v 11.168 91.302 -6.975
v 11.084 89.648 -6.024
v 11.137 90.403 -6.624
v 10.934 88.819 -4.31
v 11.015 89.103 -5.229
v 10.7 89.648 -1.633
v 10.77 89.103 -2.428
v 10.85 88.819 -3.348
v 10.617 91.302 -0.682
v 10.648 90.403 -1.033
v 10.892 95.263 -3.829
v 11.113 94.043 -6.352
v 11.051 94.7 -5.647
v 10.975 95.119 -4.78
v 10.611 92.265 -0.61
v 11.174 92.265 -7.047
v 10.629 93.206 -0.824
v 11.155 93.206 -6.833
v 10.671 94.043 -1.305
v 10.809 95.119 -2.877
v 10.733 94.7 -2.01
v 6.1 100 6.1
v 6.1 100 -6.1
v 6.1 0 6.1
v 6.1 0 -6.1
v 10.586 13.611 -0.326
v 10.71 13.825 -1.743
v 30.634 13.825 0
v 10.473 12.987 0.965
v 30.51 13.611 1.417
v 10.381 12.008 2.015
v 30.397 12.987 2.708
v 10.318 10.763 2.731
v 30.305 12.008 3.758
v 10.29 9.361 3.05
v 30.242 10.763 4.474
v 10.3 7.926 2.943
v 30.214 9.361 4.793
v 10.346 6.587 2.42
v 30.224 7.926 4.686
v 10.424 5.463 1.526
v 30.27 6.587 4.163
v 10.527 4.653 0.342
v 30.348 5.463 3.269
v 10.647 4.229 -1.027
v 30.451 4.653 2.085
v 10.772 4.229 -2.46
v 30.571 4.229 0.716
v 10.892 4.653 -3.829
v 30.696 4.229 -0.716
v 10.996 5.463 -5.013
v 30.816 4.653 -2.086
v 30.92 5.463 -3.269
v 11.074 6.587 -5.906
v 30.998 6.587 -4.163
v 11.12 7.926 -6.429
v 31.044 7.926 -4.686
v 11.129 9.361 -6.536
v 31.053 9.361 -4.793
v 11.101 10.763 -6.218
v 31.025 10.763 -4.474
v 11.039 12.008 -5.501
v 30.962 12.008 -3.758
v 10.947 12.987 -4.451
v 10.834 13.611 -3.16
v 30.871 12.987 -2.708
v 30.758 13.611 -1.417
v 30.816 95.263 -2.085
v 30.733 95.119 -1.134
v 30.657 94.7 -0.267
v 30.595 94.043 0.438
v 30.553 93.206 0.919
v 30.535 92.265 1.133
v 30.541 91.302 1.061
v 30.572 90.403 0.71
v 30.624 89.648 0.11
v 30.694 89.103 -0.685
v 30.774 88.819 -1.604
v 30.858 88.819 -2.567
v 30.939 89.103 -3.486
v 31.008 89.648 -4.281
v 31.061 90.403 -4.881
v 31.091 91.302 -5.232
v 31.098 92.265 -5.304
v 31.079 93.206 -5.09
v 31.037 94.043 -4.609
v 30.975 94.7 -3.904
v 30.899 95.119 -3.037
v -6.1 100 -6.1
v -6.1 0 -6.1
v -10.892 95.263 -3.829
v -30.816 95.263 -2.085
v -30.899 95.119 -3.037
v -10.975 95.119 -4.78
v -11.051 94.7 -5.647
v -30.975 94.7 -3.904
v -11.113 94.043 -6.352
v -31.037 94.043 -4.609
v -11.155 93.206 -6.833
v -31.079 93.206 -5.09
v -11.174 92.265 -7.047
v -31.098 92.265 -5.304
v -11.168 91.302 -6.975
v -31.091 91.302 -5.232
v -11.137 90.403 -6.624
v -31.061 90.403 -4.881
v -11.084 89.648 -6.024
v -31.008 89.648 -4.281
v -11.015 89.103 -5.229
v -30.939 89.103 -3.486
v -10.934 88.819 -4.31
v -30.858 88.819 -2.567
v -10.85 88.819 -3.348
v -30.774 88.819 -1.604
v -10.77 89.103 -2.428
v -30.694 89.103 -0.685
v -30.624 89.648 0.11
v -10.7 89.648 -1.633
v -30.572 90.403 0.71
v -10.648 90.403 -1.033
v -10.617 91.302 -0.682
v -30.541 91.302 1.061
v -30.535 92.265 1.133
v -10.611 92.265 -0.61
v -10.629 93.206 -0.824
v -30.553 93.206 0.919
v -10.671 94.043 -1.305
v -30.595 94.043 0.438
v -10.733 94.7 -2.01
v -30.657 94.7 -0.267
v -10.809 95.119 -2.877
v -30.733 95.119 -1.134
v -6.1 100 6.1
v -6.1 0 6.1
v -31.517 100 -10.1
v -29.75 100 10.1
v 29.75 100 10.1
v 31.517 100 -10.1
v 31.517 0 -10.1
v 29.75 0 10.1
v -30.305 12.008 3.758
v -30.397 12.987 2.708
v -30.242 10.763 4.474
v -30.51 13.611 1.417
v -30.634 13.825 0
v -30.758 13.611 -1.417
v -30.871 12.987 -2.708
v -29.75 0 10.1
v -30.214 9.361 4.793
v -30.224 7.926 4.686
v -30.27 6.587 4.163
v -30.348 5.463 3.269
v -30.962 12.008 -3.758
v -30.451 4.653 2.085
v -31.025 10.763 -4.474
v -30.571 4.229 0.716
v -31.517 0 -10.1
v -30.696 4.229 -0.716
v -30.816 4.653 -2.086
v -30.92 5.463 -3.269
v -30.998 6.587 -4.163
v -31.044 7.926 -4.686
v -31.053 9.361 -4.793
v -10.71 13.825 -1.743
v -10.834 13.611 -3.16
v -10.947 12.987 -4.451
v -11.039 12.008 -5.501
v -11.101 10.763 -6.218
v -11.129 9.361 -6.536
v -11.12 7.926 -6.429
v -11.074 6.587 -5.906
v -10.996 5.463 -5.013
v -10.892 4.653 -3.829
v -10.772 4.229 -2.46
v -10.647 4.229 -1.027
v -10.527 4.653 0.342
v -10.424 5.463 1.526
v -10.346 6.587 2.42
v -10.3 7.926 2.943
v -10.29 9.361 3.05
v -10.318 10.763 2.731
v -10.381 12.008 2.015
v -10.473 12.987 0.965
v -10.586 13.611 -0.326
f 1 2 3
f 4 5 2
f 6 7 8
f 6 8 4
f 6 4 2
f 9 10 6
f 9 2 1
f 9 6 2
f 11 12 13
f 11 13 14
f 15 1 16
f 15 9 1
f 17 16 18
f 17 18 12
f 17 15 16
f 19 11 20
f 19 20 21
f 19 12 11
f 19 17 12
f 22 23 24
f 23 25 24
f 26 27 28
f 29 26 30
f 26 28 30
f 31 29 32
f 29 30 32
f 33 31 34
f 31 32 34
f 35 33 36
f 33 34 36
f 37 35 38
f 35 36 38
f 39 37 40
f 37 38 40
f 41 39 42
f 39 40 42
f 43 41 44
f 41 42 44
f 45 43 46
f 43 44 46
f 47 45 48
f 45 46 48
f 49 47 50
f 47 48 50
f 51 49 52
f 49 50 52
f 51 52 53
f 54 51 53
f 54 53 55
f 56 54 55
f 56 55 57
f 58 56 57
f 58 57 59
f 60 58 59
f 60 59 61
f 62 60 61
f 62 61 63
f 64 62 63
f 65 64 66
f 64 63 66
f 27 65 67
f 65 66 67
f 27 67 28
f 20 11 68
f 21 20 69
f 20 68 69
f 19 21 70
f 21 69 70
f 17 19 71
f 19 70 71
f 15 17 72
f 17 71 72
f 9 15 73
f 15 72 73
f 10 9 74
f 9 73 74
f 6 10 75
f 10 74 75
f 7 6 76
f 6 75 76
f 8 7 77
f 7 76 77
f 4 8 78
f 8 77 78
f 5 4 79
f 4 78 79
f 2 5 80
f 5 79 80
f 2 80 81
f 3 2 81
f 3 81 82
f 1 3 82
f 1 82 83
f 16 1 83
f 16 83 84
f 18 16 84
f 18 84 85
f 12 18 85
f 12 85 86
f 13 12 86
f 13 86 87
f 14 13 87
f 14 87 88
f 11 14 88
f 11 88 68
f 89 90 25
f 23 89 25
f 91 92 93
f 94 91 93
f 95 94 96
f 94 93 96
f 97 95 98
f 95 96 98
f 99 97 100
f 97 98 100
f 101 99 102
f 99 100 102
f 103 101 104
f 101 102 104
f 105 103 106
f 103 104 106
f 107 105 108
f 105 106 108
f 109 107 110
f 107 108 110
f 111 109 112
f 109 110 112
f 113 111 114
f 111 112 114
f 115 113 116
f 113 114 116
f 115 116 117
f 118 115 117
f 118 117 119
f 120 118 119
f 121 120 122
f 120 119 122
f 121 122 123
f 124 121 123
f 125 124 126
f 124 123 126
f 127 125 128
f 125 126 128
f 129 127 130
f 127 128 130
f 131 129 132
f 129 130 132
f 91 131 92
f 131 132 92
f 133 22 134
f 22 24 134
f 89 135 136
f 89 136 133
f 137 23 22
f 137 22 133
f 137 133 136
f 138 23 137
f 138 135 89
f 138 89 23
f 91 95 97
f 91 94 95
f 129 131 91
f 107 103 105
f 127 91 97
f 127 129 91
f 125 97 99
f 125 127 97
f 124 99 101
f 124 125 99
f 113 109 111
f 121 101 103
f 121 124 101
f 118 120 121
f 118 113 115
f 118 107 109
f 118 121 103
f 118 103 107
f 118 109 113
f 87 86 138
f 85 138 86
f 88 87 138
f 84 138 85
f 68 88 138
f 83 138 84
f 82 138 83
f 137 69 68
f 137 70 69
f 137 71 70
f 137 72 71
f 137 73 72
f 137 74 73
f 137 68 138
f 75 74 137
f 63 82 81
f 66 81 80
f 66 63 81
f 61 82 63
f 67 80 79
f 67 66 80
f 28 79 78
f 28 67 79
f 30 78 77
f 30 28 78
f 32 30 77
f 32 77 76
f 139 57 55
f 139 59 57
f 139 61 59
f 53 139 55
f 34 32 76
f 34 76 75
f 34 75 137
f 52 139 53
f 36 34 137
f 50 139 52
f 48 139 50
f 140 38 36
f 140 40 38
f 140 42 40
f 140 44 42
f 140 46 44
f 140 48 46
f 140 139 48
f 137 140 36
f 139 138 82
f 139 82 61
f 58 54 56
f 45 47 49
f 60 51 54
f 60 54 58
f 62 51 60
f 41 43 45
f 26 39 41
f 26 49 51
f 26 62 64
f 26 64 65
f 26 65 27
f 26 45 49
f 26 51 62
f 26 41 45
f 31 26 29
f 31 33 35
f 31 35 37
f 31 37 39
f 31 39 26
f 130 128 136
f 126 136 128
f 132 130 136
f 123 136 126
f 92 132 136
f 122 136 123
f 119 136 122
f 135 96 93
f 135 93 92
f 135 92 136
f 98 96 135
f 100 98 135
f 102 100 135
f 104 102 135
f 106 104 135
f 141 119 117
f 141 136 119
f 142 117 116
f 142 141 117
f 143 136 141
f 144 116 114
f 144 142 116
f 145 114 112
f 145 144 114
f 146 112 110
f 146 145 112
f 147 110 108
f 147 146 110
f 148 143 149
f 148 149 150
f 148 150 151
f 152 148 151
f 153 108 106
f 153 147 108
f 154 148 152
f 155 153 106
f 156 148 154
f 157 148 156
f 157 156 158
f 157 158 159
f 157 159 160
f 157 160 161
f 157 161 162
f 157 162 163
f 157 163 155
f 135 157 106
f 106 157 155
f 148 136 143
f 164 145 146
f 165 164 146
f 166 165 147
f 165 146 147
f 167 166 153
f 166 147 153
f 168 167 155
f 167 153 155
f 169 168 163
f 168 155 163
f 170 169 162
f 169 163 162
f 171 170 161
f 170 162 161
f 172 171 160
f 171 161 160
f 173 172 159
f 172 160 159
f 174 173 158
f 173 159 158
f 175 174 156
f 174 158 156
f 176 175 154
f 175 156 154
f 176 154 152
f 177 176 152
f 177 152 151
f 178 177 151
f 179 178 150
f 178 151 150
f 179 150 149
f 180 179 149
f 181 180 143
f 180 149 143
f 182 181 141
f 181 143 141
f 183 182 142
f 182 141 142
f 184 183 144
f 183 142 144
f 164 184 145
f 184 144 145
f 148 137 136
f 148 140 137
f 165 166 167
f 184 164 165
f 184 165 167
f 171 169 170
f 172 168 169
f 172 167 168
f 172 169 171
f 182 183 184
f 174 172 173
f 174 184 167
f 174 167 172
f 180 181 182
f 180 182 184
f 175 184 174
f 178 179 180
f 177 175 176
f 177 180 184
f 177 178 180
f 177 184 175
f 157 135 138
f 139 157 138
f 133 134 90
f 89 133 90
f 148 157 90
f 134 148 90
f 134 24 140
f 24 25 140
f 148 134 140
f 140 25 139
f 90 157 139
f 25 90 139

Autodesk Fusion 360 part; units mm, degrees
sketch "Main cross-section sketch" plane through (0, 0, 0) normal (0, 1, 0) x (1, 0, 0)
  line L0 (6.1, -6.1) -> (-6.1, -6.1)
  line L1 (-6.1, -6.1) -> (-6.1, 6.1)
  line L2 (-6.1, 6.1) -> (6.1, 6.1)
  line L3 (6.1, 6.1) -> (6.1, -6.1)
  line L4 (29.75, -10.1) -> (-29.75, -10.1)
  line L5 (-29.75, -10.1) -> (-31.5173, 10.1)
  line L6 (-31.5173, 10.1) -> (31.5173, 10.1)
  line L7 (31.5173, 10.1) -> (29.75, -10.1)
  line L8 (-29.75, -10.1) -> (29.75, -10.1)
  line L9 (-6.1, -6.1) -> (-30.1, -6.1) construction
  line L10 (6.1, -6.1) -> (30.1, -6.1) construction
  line L11 (6.1, -6.1) -> (-6.1, 6.1) construction
  line L12 (6.1, 6.1) -> (-6.1, -6.1) construction
  dimension "d13" = 85
  dimension "d14" = 85
  dimension "d20" = 24
  dimension "d22" = 4
  dimension "d25" = 4
  dimension "d26" = 12.2
extrude "Extrude1" add sketch "Main cross-section sketch" along normal blind 100 makes body 1
sketch "Right side sketch" plane through (30.401, 0, 2.6597) normal (0.9962, 0, 0.0872) x (0, 1, 0)
  line L0 (0, 7.4687) -> (0, -12.8085)
  line L1 (0, -12.8085) -> (100, -12.8085)
  line L2 (100, -12.8085) -> (100, 7.4687)
  line L3 (100, 7.4687) -> (0, 7.4687)
  circle A0 centre (9, -2.6699) radius 4.825
  circle A1 centre (92.0226, -4.7633) radius 3.24
  line L4 (9, -2.6699) -> (0, -2.6699) construction
  line L5 (9, -2.6699) -> (92.0226, -2.6699) construction
  line L6 (92.0226, -2.6699) -> (100, -2.6699) construction
  dimension "d31" = 9.65
  dimension "d32" = 6.48
  dimension "d44" = 9
  dimension "d64" = 2.0934
  dimension "d65" = 83.0226
extrude "Extrude5" add sketch "Right side sketch" along normal blind 20 contours A0 | A1 bodies 1
mirror "Mirror1" about plane through (0, 0, 0) normal (1, 0, 0) of "Extrude5"
extrude "Extrude6" add sketch "Right side sketch" along normal blind 20 bodies 1
extrude "Extrude7" add 1 faces at (-30.2168, 67.337, 4.7654) along direction (-0.996195, 0, 0.087156) blind 20 on bodies 1 bodies 1
split "Split1" by plane through (0, 0, 0) normal (0, 0, 1) bodies 1 makes body 2 at (-10.5058, 33.3333, -10.1)
move_body "Move1" bodies 2 to x (-1, 0, 0) y (0, 1, 0) z (0, 0, -1) at (62.2, 0, 0.2)
delete_body "RemoveBody1" bodies 1
delete_body "RemoveBody2" bodies 2
extrude "Extrude8" add sketch "Main cross-section sketch" along normal blind 100 separate body makes body 3
extrude "Extrude9" cut sketch "Right side sketch" against normal blind 20 contours A0 | A1 bodies 3
mirror "Mirror2" about plane through (0, 0, 0) normal (1, 0, 0) of "Extrude9"
extrude "Extrude4" [suppressed]
extrude "Extrude2" [suppressed]
sketch "Left side sketch" plane through (-11.8041, 0, 1.0327) normal (-0.9962, 0, 0.0872) x (0, -1, 0)
  line L0 (0, -9.9817) -> (0, 8.2879)
  line L1 (0, 8.2879) -> (-100, 8.2879)
  line L2 (-100, 8.2879) -> (-100, -9.9817)
  line L3 (-100, -9.9817) -> (0, -9.9817)
  circle A0 centre (-92.0226, -2.9403) radius 5.19
  circle A1 centre (-92.0226, -2.9403) radius 3.19
  circle A2 centre (-9, -0.8469) radius 4.775
  circle A3 centre (-9, -0.8469) radius 6.775
  line L4 (-100, -0.8469) -> (0, -0.8469) construction
  dimension "d40" = 9.55
  dimension "d41" = 6.38
  dimension "d42" = 13.55
  dimension "d43" = 10.38
  dimension "d47" = 9
  dimension "d66" = 2.0934
  dimension "d67" = 83.0226
extrude "Extrude3" [suppressed]
hole "Hole1" [suppressed]
hole "Hole2" [suppressed]
hole "Hole3" [suppressed]
hole "Hole4" [suppressed]
equation "d42 = 9.55 mm + 4 mm"
equation "d43 = 6.38 mm + 4 mm"
